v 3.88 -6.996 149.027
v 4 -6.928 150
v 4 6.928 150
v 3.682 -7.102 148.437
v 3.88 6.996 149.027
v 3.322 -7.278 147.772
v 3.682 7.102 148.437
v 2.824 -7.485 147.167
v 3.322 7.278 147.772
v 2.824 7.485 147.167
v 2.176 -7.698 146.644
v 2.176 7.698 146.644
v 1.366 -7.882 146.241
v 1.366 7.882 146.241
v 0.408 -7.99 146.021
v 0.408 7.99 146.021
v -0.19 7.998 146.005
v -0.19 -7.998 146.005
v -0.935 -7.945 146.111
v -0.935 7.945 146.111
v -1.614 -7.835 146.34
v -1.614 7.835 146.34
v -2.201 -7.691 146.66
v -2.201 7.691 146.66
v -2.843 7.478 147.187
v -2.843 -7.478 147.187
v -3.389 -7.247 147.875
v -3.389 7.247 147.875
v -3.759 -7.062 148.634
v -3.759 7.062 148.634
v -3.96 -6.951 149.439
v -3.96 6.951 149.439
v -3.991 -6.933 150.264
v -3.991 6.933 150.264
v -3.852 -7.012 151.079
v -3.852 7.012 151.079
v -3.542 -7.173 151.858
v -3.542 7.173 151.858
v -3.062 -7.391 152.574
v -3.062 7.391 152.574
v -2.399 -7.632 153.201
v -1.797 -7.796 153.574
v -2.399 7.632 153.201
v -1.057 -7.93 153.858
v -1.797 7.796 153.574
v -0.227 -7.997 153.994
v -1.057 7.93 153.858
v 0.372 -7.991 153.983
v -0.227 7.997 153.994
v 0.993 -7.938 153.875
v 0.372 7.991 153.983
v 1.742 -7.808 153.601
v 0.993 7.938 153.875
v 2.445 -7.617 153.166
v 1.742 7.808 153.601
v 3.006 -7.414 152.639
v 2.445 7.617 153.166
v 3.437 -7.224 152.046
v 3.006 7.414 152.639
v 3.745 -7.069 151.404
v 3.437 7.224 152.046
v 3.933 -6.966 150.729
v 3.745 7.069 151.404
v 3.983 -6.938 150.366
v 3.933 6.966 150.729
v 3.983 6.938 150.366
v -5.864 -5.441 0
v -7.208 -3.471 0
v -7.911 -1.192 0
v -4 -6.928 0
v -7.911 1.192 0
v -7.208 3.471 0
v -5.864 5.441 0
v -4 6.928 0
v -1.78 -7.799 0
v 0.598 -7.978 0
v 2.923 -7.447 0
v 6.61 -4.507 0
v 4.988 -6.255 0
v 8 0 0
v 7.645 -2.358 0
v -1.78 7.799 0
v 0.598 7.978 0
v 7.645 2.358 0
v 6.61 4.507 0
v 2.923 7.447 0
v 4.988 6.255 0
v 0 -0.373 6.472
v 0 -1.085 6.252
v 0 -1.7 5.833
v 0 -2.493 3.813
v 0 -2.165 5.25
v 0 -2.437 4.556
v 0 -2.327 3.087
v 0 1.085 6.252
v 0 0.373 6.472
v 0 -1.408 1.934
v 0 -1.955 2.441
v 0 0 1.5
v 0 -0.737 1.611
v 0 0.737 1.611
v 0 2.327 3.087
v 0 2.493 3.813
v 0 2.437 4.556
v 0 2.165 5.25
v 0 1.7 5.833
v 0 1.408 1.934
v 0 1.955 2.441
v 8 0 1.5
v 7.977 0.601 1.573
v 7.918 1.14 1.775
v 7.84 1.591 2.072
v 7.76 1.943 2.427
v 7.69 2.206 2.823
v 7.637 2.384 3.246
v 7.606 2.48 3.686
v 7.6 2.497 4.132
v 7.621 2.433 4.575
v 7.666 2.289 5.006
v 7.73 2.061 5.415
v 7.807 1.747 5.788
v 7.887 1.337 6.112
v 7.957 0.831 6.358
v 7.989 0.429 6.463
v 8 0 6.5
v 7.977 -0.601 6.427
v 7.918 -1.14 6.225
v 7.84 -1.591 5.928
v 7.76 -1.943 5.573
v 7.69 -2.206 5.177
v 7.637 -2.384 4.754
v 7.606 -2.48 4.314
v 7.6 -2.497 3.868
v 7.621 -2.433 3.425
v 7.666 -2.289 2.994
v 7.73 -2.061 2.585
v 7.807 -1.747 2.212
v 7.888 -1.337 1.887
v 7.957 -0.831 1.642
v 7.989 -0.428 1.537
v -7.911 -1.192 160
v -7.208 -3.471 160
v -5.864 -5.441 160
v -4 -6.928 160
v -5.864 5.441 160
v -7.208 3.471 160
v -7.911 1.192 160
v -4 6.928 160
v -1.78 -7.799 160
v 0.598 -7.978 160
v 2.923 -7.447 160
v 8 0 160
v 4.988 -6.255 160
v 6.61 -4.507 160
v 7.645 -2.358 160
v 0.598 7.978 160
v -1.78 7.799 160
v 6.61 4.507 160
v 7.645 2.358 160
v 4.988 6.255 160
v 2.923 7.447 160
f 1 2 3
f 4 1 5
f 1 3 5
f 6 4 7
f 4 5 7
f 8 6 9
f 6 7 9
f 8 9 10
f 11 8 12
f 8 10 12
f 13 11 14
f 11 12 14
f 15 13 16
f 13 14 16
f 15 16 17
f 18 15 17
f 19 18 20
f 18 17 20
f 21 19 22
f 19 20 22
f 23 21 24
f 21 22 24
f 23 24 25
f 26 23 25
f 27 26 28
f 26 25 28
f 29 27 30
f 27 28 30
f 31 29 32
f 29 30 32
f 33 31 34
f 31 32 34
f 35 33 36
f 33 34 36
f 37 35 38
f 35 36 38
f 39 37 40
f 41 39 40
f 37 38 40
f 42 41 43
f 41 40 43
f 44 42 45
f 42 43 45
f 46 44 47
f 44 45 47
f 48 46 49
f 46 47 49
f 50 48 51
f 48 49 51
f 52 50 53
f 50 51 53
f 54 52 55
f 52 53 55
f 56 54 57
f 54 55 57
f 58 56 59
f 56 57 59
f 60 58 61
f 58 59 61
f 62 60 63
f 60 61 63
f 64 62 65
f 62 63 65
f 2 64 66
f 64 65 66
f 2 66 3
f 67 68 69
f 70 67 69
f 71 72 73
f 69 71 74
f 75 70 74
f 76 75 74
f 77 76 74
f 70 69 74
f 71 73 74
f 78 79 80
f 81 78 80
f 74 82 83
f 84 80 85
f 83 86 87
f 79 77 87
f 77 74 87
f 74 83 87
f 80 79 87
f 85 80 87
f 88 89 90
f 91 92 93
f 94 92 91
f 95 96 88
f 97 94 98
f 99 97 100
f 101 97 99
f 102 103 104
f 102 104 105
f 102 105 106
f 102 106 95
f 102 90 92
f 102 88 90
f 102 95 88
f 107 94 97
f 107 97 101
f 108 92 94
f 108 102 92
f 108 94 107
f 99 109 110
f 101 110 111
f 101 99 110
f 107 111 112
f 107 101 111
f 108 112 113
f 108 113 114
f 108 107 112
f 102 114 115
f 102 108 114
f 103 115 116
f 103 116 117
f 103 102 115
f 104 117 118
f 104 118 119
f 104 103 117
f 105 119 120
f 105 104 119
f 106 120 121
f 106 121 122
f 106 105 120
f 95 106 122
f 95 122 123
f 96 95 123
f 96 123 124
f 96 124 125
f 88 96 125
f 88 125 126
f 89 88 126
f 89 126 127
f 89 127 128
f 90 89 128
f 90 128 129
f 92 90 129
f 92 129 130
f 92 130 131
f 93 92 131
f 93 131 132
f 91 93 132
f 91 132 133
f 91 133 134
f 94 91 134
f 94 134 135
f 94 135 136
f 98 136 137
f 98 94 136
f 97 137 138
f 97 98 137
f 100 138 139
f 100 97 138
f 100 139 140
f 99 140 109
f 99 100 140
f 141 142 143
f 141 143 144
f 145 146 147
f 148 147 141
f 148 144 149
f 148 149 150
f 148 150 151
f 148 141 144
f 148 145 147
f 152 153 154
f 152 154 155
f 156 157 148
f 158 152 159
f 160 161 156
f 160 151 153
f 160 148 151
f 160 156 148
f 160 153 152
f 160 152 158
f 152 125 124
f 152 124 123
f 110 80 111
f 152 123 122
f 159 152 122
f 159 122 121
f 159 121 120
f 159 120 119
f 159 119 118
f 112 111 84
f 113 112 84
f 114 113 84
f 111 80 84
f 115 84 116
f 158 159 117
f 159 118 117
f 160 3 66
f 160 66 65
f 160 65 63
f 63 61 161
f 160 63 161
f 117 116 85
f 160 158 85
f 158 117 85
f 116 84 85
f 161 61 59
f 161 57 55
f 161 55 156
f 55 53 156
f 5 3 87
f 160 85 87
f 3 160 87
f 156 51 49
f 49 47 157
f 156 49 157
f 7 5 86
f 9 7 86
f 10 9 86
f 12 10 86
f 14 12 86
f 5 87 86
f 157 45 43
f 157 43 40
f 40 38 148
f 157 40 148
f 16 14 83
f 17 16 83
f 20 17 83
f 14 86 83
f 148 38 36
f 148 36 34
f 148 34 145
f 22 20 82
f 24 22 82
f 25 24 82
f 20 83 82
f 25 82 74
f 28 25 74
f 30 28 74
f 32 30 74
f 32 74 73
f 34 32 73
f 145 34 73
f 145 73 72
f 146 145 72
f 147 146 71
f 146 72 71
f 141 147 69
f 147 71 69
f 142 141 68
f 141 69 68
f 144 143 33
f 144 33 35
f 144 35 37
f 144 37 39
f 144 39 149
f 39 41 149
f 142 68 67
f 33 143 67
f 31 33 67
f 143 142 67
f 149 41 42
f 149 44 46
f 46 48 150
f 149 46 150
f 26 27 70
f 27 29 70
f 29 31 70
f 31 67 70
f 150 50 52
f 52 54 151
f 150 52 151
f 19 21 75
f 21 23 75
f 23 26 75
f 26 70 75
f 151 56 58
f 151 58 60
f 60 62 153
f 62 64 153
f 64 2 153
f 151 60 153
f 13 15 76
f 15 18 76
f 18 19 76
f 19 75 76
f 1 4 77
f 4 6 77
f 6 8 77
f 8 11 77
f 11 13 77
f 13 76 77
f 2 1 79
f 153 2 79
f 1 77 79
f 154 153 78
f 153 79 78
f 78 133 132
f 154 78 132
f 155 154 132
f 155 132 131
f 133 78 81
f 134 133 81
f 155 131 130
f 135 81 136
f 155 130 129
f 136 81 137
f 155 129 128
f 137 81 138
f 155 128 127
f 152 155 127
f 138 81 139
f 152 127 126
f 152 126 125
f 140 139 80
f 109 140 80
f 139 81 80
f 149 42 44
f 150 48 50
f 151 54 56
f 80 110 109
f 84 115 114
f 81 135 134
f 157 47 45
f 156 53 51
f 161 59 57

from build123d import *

# Parameters (mm, degrees)
SKETCH_1_R          = 8
EXTRUDE_1_DEPTH     = 160
SKETCH_2_R          = 4
CUT_EXTRUDE_1_DEPTH = 10
SKETCH_3_R          = 2.5
CUT_EXTRUDE_2_DEPTH = 10


with BuildPart() as part:
    # 草图1 → 凸台-拉伸1 (new body)
    with BuildSketch(Plane.XY):
        Circle(SKETCH_1_R)
    extrude(amount=EXTRUDE_1_DEPTH)

    # 草图2 → 切除-拉伸1 (cut, symmetric)
    with BuildSketch(Plane(origin=(0, 0, 0), x_dir=(1, 0, 0), z_dir=(0, 1, 0))):
        with Locations((0, -150)):
            Circle(SKETCH_2_R)
    extrude(amount=CUT_EXTRUDE_1_DEPTH, both=True, mode=Mode.SUBTRACT)

    # 草图3 → 切除-拉伸2 (cut)
    with BuildSketch(Plane(origin=(0, 0, 0), x_dir=(0, 0, -1), z_dir=(1, 0, 0))):
        with Locations((-4, 0)):
            Circle(SKETCH_3_R)
    extrude(amount=CUT_EXTRUDE_2_DEPTH, mode=Mode.SUBTRACT)


solid = part.part
